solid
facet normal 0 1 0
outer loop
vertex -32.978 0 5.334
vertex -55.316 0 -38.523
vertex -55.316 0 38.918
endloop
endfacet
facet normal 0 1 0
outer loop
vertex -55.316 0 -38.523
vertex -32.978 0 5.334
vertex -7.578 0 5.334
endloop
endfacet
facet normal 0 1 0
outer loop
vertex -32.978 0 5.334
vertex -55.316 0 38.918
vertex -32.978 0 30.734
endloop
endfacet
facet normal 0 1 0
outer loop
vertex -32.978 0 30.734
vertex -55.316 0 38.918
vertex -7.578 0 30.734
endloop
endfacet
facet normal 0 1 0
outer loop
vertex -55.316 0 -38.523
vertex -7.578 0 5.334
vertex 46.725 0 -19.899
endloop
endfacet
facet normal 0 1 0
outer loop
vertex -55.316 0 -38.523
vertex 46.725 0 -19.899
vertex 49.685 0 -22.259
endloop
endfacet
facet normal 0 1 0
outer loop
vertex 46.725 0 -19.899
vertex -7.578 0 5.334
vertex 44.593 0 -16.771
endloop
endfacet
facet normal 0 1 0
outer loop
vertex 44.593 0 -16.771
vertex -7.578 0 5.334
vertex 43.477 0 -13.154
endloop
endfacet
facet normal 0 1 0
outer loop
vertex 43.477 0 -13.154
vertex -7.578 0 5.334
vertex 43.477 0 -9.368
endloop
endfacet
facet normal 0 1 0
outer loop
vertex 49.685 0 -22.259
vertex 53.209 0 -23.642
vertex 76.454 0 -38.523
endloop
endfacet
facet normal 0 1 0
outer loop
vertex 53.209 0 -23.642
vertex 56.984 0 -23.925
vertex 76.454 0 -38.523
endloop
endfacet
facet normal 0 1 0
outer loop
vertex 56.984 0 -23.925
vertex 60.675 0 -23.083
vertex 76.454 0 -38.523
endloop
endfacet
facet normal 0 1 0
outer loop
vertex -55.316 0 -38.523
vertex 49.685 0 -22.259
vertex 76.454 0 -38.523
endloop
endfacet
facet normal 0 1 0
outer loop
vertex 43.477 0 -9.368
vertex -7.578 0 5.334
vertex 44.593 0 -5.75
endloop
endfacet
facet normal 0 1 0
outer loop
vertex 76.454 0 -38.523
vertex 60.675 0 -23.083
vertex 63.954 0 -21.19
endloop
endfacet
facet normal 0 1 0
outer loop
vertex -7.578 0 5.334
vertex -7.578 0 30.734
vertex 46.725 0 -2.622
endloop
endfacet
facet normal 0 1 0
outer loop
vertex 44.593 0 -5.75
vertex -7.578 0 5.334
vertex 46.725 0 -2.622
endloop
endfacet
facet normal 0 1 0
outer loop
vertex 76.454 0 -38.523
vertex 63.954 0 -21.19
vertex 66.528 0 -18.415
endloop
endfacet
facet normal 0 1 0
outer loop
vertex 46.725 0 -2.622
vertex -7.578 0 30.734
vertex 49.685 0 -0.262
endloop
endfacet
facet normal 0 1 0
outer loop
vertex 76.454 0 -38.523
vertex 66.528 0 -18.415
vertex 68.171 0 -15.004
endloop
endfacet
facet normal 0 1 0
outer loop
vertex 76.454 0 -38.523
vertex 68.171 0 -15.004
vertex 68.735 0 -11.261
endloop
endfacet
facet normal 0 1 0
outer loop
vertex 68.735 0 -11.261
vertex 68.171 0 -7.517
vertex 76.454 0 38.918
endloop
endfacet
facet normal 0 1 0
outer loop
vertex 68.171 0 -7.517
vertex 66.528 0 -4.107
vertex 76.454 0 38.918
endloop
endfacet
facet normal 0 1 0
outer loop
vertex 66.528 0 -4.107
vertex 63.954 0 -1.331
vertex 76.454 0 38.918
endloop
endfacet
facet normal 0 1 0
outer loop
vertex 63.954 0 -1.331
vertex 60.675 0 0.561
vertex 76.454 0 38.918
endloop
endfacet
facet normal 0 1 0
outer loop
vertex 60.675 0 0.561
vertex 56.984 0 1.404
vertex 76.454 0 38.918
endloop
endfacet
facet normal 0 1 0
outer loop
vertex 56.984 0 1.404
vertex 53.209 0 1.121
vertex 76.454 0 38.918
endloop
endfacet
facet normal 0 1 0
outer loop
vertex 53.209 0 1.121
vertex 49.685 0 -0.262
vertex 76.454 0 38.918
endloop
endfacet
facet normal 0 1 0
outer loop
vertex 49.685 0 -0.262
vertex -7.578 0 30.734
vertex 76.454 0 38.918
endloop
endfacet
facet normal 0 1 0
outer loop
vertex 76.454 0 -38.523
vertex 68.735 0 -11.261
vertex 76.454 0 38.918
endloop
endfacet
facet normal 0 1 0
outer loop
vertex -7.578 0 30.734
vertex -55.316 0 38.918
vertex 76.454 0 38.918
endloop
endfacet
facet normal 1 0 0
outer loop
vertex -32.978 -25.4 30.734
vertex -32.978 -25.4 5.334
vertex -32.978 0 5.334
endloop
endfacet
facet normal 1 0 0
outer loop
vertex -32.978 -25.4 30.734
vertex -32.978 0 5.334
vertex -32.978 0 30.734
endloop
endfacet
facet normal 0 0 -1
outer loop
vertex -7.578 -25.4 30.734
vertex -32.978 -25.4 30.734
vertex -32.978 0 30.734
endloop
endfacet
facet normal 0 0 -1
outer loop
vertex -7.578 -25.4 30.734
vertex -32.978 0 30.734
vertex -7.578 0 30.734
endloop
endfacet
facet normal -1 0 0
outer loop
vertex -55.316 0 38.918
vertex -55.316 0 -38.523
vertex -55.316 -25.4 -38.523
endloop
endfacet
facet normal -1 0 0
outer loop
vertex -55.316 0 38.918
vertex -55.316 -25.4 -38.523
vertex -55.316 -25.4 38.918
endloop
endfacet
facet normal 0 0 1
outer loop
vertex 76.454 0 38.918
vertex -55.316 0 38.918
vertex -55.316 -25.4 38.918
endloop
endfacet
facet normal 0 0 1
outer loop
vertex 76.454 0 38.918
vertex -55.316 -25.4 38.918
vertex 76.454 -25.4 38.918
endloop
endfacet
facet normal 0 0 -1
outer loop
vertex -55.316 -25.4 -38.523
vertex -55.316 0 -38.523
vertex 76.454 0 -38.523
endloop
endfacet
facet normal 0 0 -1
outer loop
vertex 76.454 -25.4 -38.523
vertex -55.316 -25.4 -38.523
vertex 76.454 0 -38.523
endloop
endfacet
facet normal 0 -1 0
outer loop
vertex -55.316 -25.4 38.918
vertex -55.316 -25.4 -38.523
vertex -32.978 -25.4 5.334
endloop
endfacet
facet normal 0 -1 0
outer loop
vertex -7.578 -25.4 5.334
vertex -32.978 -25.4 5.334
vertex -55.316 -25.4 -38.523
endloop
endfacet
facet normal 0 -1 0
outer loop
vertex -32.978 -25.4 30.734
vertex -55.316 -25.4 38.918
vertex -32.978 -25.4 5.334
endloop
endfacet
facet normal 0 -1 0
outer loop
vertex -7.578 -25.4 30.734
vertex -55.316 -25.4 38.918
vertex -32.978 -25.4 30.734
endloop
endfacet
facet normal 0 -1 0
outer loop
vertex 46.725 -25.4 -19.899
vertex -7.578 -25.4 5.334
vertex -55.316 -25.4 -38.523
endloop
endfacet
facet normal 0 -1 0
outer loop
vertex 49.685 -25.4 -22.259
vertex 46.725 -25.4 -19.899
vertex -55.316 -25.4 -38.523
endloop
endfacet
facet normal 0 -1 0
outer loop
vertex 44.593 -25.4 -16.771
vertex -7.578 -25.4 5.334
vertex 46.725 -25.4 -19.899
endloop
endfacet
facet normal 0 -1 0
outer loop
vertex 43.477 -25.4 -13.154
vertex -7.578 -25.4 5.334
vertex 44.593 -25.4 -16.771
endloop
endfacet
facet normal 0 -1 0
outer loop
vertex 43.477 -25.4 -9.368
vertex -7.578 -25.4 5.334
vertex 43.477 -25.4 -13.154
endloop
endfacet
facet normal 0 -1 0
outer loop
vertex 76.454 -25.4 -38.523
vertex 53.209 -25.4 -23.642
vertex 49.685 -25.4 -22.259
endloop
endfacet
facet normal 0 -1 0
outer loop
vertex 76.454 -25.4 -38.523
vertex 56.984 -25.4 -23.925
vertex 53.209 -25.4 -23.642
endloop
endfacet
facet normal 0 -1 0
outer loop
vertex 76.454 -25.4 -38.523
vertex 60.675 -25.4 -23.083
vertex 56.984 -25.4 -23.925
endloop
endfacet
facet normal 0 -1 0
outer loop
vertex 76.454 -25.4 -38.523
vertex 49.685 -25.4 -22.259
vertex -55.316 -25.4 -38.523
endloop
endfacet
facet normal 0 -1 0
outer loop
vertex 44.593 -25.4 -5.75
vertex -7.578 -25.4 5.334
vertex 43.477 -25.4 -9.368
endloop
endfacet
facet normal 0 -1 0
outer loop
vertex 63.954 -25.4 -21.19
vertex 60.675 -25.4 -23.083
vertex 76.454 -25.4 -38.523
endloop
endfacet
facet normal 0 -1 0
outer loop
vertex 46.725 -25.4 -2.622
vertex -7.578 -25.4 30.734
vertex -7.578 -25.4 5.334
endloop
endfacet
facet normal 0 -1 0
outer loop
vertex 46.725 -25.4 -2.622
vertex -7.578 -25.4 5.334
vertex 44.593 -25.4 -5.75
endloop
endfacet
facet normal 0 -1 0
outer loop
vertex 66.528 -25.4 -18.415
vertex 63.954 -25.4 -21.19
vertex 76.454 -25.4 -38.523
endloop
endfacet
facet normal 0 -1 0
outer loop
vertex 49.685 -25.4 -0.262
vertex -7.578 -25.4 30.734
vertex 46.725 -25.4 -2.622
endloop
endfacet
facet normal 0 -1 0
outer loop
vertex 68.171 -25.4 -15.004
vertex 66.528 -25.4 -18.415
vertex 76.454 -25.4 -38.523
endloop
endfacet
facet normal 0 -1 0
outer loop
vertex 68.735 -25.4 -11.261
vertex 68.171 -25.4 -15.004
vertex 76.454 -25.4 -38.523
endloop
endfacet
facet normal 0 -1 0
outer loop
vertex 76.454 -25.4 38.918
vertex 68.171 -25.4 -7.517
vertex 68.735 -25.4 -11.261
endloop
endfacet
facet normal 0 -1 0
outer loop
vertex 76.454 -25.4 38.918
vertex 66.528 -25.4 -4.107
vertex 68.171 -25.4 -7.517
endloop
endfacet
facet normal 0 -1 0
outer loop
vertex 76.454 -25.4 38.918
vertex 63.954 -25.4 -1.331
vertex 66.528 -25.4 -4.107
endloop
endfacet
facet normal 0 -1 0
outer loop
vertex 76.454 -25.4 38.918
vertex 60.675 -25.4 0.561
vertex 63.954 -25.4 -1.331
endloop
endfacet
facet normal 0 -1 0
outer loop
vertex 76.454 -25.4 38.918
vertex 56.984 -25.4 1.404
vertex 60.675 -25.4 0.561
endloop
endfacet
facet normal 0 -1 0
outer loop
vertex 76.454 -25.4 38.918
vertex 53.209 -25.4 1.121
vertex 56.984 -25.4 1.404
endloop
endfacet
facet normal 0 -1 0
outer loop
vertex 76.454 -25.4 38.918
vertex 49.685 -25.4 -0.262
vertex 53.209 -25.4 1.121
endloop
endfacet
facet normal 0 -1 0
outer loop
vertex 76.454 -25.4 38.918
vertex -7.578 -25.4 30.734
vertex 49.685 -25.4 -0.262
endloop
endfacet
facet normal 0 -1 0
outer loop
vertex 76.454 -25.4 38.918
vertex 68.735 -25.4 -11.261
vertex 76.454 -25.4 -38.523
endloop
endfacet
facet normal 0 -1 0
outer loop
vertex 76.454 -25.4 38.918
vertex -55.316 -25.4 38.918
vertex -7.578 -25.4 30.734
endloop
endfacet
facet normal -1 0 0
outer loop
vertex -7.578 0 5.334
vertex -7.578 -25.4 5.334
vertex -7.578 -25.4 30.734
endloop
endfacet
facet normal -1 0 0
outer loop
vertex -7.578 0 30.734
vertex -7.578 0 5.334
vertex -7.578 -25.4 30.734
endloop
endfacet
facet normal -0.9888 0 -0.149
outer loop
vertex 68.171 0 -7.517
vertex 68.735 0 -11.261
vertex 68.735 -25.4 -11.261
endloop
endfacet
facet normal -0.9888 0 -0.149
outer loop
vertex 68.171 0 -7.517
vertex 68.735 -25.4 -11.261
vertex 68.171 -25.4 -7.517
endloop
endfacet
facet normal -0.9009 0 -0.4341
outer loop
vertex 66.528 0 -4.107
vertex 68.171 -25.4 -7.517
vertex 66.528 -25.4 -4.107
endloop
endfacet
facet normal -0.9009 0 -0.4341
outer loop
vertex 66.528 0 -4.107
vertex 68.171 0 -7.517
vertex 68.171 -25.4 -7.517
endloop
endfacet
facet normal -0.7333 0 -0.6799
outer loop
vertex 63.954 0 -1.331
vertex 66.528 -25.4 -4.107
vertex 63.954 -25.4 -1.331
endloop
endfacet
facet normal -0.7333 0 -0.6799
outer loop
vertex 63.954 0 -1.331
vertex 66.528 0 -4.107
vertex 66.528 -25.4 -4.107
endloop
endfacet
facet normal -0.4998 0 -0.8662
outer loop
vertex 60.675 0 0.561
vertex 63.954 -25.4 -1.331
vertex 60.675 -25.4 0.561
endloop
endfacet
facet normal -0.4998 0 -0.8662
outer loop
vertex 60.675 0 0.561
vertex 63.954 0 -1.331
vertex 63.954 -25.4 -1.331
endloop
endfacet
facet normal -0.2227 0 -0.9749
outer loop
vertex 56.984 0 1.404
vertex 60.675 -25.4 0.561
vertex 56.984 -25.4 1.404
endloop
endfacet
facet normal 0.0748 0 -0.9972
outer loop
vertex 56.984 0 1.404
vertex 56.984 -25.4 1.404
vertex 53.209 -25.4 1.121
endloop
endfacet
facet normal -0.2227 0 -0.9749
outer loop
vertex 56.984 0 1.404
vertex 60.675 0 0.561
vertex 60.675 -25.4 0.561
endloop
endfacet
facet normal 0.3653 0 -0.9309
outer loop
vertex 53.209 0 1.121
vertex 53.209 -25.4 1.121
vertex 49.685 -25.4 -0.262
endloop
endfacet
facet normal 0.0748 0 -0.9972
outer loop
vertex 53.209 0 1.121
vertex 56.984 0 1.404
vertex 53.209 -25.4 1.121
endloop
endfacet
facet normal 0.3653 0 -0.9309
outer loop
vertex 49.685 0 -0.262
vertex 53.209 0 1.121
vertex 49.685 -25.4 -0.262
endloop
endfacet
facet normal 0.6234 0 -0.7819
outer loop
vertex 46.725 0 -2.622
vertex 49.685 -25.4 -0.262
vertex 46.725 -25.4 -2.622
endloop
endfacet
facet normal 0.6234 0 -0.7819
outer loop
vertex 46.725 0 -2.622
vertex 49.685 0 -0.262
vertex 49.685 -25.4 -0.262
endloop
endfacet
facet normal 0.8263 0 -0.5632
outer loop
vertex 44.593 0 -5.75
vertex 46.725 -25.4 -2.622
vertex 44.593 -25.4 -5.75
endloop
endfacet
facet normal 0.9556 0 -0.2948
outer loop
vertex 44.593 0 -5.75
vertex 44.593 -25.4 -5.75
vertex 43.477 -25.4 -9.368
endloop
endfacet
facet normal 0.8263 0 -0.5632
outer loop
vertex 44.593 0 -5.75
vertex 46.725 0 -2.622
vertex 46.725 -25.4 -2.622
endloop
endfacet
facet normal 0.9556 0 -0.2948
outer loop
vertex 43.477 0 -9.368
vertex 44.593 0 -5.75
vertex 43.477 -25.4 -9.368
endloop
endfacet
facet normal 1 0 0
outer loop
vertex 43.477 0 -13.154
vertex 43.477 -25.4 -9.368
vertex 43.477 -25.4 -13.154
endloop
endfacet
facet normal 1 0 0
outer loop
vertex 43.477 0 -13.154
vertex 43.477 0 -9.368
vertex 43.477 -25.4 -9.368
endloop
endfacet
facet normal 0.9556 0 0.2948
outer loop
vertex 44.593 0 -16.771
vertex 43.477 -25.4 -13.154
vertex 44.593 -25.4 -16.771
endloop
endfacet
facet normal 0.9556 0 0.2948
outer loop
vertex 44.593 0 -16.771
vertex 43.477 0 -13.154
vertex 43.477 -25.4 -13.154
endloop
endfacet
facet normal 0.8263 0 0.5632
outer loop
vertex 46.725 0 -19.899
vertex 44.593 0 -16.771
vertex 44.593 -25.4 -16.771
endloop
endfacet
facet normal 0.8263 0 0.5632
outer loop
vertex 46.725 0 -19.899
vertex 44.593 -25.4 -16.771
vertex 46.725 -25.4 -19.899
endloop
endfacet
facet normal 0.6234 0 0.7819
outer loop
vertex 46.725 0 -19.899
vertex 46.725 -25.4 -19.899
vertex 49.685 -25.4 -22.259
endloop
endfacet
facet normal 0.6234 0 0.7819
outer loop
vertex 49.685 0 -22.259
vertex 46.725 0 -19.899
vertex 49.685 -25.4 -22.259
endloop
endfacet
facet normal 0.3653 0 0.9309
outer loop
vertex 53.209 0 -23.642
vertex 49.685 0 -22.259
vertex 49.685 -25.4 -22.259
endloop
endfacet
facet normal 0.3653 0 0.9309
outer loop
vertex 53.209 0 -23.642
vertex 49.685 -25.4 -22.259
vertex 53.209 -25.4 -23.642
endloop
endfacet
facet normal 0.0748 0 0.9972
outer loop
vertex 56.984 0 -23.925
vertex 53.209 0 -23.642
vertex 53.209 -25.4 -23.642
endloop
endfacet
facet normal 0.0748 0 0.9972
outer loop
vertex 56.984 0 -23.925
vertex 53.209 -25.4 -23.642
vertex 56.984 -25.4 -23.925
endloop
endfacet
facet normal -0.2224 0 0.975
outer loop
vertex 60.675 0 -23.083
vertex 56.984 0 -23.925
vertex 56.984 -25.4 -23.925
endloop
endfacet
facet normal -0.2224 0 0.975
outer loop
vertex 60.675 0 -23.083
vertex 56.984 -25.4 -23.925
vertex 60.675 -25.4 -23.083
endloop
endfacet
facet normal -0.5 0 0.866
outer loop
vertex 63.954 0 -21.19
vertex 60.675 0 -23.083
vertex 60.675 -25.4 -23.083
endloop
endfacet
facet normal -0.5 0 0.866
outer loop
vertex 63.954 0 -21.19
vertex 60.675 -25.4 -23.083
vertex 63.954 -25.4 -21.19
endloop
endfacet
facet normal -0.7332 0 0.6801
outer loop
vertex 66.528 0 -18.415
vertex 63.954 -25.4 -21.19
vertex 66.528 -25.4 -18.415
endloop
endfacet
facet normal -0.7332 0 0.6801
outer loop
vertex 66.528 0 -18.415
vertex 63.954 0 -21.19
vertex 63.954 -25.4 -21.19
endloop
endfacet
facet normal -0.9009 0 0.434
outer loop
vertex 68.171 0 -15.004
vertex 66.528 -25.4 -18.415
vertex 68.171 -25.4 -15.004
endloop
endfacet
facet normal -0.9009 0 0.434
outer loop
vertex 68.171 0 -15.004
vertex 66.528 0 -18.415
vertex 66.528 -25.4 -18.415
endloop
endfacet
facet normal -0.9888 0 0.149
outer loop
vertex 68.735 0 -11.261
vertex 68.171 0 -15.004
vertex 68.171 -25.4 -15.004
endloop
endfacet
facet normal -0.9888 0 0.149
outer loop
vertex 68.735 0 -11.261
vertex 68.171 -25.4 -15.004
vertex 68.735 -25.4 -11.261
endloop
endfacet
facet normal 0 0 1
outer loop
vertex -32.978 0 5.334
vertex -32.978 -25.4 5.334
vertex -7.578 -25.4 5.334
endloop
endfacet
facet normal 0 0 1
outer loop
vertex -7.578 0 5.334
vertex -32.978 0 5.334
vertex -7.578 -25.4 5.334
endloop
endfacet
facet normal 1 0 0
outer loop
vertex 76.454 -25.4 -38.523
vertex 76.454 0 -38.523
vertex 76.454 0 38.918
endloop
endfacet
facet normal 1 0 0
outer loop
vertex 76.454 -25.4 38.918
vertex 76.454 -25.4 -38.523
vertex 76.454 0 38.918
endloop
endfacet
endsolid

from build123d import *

# Parameters (mm, degrees)
F0_W     = 131.769553
F0_H     = 77.441782
F1_DEPTH = 25.4
F2_R     = 12.7
F3_DEPTH = 25.4
F4_W     = 25.4
F4_H     = 25.4
F5_DEPTH = 25.4


with BuildPart() as f1:
    # F0 (on Front) → F1 (new body)
    with BuildSketch(Plane.XZ):
        with Locations((10.569222, 0.197556)):
            Rectangle(F0_W, F0_H)
    extrude(amount=F1_DEPTH)

    # F2 (on Front) → F3 (cut)
    with BuildSketch(Plane.XZ):
        with Locations((56.035224, -11.260667)):
            Circle(F2_R)
    extrude(amount=F3_DEPTH, mode=Mode.SUBTRACT)

    # F4 (on face) → F5 (cut)
    with BuildSketch(Plane.XZ.offset(25.4)):
        with Locations((-20.277668, 18.034001)):
            Rectangle(F4_W, F4_H)
    extrude(amount=-F5_DEPTH, mode=Mode.SUBTRACT)


solid = f1.part
